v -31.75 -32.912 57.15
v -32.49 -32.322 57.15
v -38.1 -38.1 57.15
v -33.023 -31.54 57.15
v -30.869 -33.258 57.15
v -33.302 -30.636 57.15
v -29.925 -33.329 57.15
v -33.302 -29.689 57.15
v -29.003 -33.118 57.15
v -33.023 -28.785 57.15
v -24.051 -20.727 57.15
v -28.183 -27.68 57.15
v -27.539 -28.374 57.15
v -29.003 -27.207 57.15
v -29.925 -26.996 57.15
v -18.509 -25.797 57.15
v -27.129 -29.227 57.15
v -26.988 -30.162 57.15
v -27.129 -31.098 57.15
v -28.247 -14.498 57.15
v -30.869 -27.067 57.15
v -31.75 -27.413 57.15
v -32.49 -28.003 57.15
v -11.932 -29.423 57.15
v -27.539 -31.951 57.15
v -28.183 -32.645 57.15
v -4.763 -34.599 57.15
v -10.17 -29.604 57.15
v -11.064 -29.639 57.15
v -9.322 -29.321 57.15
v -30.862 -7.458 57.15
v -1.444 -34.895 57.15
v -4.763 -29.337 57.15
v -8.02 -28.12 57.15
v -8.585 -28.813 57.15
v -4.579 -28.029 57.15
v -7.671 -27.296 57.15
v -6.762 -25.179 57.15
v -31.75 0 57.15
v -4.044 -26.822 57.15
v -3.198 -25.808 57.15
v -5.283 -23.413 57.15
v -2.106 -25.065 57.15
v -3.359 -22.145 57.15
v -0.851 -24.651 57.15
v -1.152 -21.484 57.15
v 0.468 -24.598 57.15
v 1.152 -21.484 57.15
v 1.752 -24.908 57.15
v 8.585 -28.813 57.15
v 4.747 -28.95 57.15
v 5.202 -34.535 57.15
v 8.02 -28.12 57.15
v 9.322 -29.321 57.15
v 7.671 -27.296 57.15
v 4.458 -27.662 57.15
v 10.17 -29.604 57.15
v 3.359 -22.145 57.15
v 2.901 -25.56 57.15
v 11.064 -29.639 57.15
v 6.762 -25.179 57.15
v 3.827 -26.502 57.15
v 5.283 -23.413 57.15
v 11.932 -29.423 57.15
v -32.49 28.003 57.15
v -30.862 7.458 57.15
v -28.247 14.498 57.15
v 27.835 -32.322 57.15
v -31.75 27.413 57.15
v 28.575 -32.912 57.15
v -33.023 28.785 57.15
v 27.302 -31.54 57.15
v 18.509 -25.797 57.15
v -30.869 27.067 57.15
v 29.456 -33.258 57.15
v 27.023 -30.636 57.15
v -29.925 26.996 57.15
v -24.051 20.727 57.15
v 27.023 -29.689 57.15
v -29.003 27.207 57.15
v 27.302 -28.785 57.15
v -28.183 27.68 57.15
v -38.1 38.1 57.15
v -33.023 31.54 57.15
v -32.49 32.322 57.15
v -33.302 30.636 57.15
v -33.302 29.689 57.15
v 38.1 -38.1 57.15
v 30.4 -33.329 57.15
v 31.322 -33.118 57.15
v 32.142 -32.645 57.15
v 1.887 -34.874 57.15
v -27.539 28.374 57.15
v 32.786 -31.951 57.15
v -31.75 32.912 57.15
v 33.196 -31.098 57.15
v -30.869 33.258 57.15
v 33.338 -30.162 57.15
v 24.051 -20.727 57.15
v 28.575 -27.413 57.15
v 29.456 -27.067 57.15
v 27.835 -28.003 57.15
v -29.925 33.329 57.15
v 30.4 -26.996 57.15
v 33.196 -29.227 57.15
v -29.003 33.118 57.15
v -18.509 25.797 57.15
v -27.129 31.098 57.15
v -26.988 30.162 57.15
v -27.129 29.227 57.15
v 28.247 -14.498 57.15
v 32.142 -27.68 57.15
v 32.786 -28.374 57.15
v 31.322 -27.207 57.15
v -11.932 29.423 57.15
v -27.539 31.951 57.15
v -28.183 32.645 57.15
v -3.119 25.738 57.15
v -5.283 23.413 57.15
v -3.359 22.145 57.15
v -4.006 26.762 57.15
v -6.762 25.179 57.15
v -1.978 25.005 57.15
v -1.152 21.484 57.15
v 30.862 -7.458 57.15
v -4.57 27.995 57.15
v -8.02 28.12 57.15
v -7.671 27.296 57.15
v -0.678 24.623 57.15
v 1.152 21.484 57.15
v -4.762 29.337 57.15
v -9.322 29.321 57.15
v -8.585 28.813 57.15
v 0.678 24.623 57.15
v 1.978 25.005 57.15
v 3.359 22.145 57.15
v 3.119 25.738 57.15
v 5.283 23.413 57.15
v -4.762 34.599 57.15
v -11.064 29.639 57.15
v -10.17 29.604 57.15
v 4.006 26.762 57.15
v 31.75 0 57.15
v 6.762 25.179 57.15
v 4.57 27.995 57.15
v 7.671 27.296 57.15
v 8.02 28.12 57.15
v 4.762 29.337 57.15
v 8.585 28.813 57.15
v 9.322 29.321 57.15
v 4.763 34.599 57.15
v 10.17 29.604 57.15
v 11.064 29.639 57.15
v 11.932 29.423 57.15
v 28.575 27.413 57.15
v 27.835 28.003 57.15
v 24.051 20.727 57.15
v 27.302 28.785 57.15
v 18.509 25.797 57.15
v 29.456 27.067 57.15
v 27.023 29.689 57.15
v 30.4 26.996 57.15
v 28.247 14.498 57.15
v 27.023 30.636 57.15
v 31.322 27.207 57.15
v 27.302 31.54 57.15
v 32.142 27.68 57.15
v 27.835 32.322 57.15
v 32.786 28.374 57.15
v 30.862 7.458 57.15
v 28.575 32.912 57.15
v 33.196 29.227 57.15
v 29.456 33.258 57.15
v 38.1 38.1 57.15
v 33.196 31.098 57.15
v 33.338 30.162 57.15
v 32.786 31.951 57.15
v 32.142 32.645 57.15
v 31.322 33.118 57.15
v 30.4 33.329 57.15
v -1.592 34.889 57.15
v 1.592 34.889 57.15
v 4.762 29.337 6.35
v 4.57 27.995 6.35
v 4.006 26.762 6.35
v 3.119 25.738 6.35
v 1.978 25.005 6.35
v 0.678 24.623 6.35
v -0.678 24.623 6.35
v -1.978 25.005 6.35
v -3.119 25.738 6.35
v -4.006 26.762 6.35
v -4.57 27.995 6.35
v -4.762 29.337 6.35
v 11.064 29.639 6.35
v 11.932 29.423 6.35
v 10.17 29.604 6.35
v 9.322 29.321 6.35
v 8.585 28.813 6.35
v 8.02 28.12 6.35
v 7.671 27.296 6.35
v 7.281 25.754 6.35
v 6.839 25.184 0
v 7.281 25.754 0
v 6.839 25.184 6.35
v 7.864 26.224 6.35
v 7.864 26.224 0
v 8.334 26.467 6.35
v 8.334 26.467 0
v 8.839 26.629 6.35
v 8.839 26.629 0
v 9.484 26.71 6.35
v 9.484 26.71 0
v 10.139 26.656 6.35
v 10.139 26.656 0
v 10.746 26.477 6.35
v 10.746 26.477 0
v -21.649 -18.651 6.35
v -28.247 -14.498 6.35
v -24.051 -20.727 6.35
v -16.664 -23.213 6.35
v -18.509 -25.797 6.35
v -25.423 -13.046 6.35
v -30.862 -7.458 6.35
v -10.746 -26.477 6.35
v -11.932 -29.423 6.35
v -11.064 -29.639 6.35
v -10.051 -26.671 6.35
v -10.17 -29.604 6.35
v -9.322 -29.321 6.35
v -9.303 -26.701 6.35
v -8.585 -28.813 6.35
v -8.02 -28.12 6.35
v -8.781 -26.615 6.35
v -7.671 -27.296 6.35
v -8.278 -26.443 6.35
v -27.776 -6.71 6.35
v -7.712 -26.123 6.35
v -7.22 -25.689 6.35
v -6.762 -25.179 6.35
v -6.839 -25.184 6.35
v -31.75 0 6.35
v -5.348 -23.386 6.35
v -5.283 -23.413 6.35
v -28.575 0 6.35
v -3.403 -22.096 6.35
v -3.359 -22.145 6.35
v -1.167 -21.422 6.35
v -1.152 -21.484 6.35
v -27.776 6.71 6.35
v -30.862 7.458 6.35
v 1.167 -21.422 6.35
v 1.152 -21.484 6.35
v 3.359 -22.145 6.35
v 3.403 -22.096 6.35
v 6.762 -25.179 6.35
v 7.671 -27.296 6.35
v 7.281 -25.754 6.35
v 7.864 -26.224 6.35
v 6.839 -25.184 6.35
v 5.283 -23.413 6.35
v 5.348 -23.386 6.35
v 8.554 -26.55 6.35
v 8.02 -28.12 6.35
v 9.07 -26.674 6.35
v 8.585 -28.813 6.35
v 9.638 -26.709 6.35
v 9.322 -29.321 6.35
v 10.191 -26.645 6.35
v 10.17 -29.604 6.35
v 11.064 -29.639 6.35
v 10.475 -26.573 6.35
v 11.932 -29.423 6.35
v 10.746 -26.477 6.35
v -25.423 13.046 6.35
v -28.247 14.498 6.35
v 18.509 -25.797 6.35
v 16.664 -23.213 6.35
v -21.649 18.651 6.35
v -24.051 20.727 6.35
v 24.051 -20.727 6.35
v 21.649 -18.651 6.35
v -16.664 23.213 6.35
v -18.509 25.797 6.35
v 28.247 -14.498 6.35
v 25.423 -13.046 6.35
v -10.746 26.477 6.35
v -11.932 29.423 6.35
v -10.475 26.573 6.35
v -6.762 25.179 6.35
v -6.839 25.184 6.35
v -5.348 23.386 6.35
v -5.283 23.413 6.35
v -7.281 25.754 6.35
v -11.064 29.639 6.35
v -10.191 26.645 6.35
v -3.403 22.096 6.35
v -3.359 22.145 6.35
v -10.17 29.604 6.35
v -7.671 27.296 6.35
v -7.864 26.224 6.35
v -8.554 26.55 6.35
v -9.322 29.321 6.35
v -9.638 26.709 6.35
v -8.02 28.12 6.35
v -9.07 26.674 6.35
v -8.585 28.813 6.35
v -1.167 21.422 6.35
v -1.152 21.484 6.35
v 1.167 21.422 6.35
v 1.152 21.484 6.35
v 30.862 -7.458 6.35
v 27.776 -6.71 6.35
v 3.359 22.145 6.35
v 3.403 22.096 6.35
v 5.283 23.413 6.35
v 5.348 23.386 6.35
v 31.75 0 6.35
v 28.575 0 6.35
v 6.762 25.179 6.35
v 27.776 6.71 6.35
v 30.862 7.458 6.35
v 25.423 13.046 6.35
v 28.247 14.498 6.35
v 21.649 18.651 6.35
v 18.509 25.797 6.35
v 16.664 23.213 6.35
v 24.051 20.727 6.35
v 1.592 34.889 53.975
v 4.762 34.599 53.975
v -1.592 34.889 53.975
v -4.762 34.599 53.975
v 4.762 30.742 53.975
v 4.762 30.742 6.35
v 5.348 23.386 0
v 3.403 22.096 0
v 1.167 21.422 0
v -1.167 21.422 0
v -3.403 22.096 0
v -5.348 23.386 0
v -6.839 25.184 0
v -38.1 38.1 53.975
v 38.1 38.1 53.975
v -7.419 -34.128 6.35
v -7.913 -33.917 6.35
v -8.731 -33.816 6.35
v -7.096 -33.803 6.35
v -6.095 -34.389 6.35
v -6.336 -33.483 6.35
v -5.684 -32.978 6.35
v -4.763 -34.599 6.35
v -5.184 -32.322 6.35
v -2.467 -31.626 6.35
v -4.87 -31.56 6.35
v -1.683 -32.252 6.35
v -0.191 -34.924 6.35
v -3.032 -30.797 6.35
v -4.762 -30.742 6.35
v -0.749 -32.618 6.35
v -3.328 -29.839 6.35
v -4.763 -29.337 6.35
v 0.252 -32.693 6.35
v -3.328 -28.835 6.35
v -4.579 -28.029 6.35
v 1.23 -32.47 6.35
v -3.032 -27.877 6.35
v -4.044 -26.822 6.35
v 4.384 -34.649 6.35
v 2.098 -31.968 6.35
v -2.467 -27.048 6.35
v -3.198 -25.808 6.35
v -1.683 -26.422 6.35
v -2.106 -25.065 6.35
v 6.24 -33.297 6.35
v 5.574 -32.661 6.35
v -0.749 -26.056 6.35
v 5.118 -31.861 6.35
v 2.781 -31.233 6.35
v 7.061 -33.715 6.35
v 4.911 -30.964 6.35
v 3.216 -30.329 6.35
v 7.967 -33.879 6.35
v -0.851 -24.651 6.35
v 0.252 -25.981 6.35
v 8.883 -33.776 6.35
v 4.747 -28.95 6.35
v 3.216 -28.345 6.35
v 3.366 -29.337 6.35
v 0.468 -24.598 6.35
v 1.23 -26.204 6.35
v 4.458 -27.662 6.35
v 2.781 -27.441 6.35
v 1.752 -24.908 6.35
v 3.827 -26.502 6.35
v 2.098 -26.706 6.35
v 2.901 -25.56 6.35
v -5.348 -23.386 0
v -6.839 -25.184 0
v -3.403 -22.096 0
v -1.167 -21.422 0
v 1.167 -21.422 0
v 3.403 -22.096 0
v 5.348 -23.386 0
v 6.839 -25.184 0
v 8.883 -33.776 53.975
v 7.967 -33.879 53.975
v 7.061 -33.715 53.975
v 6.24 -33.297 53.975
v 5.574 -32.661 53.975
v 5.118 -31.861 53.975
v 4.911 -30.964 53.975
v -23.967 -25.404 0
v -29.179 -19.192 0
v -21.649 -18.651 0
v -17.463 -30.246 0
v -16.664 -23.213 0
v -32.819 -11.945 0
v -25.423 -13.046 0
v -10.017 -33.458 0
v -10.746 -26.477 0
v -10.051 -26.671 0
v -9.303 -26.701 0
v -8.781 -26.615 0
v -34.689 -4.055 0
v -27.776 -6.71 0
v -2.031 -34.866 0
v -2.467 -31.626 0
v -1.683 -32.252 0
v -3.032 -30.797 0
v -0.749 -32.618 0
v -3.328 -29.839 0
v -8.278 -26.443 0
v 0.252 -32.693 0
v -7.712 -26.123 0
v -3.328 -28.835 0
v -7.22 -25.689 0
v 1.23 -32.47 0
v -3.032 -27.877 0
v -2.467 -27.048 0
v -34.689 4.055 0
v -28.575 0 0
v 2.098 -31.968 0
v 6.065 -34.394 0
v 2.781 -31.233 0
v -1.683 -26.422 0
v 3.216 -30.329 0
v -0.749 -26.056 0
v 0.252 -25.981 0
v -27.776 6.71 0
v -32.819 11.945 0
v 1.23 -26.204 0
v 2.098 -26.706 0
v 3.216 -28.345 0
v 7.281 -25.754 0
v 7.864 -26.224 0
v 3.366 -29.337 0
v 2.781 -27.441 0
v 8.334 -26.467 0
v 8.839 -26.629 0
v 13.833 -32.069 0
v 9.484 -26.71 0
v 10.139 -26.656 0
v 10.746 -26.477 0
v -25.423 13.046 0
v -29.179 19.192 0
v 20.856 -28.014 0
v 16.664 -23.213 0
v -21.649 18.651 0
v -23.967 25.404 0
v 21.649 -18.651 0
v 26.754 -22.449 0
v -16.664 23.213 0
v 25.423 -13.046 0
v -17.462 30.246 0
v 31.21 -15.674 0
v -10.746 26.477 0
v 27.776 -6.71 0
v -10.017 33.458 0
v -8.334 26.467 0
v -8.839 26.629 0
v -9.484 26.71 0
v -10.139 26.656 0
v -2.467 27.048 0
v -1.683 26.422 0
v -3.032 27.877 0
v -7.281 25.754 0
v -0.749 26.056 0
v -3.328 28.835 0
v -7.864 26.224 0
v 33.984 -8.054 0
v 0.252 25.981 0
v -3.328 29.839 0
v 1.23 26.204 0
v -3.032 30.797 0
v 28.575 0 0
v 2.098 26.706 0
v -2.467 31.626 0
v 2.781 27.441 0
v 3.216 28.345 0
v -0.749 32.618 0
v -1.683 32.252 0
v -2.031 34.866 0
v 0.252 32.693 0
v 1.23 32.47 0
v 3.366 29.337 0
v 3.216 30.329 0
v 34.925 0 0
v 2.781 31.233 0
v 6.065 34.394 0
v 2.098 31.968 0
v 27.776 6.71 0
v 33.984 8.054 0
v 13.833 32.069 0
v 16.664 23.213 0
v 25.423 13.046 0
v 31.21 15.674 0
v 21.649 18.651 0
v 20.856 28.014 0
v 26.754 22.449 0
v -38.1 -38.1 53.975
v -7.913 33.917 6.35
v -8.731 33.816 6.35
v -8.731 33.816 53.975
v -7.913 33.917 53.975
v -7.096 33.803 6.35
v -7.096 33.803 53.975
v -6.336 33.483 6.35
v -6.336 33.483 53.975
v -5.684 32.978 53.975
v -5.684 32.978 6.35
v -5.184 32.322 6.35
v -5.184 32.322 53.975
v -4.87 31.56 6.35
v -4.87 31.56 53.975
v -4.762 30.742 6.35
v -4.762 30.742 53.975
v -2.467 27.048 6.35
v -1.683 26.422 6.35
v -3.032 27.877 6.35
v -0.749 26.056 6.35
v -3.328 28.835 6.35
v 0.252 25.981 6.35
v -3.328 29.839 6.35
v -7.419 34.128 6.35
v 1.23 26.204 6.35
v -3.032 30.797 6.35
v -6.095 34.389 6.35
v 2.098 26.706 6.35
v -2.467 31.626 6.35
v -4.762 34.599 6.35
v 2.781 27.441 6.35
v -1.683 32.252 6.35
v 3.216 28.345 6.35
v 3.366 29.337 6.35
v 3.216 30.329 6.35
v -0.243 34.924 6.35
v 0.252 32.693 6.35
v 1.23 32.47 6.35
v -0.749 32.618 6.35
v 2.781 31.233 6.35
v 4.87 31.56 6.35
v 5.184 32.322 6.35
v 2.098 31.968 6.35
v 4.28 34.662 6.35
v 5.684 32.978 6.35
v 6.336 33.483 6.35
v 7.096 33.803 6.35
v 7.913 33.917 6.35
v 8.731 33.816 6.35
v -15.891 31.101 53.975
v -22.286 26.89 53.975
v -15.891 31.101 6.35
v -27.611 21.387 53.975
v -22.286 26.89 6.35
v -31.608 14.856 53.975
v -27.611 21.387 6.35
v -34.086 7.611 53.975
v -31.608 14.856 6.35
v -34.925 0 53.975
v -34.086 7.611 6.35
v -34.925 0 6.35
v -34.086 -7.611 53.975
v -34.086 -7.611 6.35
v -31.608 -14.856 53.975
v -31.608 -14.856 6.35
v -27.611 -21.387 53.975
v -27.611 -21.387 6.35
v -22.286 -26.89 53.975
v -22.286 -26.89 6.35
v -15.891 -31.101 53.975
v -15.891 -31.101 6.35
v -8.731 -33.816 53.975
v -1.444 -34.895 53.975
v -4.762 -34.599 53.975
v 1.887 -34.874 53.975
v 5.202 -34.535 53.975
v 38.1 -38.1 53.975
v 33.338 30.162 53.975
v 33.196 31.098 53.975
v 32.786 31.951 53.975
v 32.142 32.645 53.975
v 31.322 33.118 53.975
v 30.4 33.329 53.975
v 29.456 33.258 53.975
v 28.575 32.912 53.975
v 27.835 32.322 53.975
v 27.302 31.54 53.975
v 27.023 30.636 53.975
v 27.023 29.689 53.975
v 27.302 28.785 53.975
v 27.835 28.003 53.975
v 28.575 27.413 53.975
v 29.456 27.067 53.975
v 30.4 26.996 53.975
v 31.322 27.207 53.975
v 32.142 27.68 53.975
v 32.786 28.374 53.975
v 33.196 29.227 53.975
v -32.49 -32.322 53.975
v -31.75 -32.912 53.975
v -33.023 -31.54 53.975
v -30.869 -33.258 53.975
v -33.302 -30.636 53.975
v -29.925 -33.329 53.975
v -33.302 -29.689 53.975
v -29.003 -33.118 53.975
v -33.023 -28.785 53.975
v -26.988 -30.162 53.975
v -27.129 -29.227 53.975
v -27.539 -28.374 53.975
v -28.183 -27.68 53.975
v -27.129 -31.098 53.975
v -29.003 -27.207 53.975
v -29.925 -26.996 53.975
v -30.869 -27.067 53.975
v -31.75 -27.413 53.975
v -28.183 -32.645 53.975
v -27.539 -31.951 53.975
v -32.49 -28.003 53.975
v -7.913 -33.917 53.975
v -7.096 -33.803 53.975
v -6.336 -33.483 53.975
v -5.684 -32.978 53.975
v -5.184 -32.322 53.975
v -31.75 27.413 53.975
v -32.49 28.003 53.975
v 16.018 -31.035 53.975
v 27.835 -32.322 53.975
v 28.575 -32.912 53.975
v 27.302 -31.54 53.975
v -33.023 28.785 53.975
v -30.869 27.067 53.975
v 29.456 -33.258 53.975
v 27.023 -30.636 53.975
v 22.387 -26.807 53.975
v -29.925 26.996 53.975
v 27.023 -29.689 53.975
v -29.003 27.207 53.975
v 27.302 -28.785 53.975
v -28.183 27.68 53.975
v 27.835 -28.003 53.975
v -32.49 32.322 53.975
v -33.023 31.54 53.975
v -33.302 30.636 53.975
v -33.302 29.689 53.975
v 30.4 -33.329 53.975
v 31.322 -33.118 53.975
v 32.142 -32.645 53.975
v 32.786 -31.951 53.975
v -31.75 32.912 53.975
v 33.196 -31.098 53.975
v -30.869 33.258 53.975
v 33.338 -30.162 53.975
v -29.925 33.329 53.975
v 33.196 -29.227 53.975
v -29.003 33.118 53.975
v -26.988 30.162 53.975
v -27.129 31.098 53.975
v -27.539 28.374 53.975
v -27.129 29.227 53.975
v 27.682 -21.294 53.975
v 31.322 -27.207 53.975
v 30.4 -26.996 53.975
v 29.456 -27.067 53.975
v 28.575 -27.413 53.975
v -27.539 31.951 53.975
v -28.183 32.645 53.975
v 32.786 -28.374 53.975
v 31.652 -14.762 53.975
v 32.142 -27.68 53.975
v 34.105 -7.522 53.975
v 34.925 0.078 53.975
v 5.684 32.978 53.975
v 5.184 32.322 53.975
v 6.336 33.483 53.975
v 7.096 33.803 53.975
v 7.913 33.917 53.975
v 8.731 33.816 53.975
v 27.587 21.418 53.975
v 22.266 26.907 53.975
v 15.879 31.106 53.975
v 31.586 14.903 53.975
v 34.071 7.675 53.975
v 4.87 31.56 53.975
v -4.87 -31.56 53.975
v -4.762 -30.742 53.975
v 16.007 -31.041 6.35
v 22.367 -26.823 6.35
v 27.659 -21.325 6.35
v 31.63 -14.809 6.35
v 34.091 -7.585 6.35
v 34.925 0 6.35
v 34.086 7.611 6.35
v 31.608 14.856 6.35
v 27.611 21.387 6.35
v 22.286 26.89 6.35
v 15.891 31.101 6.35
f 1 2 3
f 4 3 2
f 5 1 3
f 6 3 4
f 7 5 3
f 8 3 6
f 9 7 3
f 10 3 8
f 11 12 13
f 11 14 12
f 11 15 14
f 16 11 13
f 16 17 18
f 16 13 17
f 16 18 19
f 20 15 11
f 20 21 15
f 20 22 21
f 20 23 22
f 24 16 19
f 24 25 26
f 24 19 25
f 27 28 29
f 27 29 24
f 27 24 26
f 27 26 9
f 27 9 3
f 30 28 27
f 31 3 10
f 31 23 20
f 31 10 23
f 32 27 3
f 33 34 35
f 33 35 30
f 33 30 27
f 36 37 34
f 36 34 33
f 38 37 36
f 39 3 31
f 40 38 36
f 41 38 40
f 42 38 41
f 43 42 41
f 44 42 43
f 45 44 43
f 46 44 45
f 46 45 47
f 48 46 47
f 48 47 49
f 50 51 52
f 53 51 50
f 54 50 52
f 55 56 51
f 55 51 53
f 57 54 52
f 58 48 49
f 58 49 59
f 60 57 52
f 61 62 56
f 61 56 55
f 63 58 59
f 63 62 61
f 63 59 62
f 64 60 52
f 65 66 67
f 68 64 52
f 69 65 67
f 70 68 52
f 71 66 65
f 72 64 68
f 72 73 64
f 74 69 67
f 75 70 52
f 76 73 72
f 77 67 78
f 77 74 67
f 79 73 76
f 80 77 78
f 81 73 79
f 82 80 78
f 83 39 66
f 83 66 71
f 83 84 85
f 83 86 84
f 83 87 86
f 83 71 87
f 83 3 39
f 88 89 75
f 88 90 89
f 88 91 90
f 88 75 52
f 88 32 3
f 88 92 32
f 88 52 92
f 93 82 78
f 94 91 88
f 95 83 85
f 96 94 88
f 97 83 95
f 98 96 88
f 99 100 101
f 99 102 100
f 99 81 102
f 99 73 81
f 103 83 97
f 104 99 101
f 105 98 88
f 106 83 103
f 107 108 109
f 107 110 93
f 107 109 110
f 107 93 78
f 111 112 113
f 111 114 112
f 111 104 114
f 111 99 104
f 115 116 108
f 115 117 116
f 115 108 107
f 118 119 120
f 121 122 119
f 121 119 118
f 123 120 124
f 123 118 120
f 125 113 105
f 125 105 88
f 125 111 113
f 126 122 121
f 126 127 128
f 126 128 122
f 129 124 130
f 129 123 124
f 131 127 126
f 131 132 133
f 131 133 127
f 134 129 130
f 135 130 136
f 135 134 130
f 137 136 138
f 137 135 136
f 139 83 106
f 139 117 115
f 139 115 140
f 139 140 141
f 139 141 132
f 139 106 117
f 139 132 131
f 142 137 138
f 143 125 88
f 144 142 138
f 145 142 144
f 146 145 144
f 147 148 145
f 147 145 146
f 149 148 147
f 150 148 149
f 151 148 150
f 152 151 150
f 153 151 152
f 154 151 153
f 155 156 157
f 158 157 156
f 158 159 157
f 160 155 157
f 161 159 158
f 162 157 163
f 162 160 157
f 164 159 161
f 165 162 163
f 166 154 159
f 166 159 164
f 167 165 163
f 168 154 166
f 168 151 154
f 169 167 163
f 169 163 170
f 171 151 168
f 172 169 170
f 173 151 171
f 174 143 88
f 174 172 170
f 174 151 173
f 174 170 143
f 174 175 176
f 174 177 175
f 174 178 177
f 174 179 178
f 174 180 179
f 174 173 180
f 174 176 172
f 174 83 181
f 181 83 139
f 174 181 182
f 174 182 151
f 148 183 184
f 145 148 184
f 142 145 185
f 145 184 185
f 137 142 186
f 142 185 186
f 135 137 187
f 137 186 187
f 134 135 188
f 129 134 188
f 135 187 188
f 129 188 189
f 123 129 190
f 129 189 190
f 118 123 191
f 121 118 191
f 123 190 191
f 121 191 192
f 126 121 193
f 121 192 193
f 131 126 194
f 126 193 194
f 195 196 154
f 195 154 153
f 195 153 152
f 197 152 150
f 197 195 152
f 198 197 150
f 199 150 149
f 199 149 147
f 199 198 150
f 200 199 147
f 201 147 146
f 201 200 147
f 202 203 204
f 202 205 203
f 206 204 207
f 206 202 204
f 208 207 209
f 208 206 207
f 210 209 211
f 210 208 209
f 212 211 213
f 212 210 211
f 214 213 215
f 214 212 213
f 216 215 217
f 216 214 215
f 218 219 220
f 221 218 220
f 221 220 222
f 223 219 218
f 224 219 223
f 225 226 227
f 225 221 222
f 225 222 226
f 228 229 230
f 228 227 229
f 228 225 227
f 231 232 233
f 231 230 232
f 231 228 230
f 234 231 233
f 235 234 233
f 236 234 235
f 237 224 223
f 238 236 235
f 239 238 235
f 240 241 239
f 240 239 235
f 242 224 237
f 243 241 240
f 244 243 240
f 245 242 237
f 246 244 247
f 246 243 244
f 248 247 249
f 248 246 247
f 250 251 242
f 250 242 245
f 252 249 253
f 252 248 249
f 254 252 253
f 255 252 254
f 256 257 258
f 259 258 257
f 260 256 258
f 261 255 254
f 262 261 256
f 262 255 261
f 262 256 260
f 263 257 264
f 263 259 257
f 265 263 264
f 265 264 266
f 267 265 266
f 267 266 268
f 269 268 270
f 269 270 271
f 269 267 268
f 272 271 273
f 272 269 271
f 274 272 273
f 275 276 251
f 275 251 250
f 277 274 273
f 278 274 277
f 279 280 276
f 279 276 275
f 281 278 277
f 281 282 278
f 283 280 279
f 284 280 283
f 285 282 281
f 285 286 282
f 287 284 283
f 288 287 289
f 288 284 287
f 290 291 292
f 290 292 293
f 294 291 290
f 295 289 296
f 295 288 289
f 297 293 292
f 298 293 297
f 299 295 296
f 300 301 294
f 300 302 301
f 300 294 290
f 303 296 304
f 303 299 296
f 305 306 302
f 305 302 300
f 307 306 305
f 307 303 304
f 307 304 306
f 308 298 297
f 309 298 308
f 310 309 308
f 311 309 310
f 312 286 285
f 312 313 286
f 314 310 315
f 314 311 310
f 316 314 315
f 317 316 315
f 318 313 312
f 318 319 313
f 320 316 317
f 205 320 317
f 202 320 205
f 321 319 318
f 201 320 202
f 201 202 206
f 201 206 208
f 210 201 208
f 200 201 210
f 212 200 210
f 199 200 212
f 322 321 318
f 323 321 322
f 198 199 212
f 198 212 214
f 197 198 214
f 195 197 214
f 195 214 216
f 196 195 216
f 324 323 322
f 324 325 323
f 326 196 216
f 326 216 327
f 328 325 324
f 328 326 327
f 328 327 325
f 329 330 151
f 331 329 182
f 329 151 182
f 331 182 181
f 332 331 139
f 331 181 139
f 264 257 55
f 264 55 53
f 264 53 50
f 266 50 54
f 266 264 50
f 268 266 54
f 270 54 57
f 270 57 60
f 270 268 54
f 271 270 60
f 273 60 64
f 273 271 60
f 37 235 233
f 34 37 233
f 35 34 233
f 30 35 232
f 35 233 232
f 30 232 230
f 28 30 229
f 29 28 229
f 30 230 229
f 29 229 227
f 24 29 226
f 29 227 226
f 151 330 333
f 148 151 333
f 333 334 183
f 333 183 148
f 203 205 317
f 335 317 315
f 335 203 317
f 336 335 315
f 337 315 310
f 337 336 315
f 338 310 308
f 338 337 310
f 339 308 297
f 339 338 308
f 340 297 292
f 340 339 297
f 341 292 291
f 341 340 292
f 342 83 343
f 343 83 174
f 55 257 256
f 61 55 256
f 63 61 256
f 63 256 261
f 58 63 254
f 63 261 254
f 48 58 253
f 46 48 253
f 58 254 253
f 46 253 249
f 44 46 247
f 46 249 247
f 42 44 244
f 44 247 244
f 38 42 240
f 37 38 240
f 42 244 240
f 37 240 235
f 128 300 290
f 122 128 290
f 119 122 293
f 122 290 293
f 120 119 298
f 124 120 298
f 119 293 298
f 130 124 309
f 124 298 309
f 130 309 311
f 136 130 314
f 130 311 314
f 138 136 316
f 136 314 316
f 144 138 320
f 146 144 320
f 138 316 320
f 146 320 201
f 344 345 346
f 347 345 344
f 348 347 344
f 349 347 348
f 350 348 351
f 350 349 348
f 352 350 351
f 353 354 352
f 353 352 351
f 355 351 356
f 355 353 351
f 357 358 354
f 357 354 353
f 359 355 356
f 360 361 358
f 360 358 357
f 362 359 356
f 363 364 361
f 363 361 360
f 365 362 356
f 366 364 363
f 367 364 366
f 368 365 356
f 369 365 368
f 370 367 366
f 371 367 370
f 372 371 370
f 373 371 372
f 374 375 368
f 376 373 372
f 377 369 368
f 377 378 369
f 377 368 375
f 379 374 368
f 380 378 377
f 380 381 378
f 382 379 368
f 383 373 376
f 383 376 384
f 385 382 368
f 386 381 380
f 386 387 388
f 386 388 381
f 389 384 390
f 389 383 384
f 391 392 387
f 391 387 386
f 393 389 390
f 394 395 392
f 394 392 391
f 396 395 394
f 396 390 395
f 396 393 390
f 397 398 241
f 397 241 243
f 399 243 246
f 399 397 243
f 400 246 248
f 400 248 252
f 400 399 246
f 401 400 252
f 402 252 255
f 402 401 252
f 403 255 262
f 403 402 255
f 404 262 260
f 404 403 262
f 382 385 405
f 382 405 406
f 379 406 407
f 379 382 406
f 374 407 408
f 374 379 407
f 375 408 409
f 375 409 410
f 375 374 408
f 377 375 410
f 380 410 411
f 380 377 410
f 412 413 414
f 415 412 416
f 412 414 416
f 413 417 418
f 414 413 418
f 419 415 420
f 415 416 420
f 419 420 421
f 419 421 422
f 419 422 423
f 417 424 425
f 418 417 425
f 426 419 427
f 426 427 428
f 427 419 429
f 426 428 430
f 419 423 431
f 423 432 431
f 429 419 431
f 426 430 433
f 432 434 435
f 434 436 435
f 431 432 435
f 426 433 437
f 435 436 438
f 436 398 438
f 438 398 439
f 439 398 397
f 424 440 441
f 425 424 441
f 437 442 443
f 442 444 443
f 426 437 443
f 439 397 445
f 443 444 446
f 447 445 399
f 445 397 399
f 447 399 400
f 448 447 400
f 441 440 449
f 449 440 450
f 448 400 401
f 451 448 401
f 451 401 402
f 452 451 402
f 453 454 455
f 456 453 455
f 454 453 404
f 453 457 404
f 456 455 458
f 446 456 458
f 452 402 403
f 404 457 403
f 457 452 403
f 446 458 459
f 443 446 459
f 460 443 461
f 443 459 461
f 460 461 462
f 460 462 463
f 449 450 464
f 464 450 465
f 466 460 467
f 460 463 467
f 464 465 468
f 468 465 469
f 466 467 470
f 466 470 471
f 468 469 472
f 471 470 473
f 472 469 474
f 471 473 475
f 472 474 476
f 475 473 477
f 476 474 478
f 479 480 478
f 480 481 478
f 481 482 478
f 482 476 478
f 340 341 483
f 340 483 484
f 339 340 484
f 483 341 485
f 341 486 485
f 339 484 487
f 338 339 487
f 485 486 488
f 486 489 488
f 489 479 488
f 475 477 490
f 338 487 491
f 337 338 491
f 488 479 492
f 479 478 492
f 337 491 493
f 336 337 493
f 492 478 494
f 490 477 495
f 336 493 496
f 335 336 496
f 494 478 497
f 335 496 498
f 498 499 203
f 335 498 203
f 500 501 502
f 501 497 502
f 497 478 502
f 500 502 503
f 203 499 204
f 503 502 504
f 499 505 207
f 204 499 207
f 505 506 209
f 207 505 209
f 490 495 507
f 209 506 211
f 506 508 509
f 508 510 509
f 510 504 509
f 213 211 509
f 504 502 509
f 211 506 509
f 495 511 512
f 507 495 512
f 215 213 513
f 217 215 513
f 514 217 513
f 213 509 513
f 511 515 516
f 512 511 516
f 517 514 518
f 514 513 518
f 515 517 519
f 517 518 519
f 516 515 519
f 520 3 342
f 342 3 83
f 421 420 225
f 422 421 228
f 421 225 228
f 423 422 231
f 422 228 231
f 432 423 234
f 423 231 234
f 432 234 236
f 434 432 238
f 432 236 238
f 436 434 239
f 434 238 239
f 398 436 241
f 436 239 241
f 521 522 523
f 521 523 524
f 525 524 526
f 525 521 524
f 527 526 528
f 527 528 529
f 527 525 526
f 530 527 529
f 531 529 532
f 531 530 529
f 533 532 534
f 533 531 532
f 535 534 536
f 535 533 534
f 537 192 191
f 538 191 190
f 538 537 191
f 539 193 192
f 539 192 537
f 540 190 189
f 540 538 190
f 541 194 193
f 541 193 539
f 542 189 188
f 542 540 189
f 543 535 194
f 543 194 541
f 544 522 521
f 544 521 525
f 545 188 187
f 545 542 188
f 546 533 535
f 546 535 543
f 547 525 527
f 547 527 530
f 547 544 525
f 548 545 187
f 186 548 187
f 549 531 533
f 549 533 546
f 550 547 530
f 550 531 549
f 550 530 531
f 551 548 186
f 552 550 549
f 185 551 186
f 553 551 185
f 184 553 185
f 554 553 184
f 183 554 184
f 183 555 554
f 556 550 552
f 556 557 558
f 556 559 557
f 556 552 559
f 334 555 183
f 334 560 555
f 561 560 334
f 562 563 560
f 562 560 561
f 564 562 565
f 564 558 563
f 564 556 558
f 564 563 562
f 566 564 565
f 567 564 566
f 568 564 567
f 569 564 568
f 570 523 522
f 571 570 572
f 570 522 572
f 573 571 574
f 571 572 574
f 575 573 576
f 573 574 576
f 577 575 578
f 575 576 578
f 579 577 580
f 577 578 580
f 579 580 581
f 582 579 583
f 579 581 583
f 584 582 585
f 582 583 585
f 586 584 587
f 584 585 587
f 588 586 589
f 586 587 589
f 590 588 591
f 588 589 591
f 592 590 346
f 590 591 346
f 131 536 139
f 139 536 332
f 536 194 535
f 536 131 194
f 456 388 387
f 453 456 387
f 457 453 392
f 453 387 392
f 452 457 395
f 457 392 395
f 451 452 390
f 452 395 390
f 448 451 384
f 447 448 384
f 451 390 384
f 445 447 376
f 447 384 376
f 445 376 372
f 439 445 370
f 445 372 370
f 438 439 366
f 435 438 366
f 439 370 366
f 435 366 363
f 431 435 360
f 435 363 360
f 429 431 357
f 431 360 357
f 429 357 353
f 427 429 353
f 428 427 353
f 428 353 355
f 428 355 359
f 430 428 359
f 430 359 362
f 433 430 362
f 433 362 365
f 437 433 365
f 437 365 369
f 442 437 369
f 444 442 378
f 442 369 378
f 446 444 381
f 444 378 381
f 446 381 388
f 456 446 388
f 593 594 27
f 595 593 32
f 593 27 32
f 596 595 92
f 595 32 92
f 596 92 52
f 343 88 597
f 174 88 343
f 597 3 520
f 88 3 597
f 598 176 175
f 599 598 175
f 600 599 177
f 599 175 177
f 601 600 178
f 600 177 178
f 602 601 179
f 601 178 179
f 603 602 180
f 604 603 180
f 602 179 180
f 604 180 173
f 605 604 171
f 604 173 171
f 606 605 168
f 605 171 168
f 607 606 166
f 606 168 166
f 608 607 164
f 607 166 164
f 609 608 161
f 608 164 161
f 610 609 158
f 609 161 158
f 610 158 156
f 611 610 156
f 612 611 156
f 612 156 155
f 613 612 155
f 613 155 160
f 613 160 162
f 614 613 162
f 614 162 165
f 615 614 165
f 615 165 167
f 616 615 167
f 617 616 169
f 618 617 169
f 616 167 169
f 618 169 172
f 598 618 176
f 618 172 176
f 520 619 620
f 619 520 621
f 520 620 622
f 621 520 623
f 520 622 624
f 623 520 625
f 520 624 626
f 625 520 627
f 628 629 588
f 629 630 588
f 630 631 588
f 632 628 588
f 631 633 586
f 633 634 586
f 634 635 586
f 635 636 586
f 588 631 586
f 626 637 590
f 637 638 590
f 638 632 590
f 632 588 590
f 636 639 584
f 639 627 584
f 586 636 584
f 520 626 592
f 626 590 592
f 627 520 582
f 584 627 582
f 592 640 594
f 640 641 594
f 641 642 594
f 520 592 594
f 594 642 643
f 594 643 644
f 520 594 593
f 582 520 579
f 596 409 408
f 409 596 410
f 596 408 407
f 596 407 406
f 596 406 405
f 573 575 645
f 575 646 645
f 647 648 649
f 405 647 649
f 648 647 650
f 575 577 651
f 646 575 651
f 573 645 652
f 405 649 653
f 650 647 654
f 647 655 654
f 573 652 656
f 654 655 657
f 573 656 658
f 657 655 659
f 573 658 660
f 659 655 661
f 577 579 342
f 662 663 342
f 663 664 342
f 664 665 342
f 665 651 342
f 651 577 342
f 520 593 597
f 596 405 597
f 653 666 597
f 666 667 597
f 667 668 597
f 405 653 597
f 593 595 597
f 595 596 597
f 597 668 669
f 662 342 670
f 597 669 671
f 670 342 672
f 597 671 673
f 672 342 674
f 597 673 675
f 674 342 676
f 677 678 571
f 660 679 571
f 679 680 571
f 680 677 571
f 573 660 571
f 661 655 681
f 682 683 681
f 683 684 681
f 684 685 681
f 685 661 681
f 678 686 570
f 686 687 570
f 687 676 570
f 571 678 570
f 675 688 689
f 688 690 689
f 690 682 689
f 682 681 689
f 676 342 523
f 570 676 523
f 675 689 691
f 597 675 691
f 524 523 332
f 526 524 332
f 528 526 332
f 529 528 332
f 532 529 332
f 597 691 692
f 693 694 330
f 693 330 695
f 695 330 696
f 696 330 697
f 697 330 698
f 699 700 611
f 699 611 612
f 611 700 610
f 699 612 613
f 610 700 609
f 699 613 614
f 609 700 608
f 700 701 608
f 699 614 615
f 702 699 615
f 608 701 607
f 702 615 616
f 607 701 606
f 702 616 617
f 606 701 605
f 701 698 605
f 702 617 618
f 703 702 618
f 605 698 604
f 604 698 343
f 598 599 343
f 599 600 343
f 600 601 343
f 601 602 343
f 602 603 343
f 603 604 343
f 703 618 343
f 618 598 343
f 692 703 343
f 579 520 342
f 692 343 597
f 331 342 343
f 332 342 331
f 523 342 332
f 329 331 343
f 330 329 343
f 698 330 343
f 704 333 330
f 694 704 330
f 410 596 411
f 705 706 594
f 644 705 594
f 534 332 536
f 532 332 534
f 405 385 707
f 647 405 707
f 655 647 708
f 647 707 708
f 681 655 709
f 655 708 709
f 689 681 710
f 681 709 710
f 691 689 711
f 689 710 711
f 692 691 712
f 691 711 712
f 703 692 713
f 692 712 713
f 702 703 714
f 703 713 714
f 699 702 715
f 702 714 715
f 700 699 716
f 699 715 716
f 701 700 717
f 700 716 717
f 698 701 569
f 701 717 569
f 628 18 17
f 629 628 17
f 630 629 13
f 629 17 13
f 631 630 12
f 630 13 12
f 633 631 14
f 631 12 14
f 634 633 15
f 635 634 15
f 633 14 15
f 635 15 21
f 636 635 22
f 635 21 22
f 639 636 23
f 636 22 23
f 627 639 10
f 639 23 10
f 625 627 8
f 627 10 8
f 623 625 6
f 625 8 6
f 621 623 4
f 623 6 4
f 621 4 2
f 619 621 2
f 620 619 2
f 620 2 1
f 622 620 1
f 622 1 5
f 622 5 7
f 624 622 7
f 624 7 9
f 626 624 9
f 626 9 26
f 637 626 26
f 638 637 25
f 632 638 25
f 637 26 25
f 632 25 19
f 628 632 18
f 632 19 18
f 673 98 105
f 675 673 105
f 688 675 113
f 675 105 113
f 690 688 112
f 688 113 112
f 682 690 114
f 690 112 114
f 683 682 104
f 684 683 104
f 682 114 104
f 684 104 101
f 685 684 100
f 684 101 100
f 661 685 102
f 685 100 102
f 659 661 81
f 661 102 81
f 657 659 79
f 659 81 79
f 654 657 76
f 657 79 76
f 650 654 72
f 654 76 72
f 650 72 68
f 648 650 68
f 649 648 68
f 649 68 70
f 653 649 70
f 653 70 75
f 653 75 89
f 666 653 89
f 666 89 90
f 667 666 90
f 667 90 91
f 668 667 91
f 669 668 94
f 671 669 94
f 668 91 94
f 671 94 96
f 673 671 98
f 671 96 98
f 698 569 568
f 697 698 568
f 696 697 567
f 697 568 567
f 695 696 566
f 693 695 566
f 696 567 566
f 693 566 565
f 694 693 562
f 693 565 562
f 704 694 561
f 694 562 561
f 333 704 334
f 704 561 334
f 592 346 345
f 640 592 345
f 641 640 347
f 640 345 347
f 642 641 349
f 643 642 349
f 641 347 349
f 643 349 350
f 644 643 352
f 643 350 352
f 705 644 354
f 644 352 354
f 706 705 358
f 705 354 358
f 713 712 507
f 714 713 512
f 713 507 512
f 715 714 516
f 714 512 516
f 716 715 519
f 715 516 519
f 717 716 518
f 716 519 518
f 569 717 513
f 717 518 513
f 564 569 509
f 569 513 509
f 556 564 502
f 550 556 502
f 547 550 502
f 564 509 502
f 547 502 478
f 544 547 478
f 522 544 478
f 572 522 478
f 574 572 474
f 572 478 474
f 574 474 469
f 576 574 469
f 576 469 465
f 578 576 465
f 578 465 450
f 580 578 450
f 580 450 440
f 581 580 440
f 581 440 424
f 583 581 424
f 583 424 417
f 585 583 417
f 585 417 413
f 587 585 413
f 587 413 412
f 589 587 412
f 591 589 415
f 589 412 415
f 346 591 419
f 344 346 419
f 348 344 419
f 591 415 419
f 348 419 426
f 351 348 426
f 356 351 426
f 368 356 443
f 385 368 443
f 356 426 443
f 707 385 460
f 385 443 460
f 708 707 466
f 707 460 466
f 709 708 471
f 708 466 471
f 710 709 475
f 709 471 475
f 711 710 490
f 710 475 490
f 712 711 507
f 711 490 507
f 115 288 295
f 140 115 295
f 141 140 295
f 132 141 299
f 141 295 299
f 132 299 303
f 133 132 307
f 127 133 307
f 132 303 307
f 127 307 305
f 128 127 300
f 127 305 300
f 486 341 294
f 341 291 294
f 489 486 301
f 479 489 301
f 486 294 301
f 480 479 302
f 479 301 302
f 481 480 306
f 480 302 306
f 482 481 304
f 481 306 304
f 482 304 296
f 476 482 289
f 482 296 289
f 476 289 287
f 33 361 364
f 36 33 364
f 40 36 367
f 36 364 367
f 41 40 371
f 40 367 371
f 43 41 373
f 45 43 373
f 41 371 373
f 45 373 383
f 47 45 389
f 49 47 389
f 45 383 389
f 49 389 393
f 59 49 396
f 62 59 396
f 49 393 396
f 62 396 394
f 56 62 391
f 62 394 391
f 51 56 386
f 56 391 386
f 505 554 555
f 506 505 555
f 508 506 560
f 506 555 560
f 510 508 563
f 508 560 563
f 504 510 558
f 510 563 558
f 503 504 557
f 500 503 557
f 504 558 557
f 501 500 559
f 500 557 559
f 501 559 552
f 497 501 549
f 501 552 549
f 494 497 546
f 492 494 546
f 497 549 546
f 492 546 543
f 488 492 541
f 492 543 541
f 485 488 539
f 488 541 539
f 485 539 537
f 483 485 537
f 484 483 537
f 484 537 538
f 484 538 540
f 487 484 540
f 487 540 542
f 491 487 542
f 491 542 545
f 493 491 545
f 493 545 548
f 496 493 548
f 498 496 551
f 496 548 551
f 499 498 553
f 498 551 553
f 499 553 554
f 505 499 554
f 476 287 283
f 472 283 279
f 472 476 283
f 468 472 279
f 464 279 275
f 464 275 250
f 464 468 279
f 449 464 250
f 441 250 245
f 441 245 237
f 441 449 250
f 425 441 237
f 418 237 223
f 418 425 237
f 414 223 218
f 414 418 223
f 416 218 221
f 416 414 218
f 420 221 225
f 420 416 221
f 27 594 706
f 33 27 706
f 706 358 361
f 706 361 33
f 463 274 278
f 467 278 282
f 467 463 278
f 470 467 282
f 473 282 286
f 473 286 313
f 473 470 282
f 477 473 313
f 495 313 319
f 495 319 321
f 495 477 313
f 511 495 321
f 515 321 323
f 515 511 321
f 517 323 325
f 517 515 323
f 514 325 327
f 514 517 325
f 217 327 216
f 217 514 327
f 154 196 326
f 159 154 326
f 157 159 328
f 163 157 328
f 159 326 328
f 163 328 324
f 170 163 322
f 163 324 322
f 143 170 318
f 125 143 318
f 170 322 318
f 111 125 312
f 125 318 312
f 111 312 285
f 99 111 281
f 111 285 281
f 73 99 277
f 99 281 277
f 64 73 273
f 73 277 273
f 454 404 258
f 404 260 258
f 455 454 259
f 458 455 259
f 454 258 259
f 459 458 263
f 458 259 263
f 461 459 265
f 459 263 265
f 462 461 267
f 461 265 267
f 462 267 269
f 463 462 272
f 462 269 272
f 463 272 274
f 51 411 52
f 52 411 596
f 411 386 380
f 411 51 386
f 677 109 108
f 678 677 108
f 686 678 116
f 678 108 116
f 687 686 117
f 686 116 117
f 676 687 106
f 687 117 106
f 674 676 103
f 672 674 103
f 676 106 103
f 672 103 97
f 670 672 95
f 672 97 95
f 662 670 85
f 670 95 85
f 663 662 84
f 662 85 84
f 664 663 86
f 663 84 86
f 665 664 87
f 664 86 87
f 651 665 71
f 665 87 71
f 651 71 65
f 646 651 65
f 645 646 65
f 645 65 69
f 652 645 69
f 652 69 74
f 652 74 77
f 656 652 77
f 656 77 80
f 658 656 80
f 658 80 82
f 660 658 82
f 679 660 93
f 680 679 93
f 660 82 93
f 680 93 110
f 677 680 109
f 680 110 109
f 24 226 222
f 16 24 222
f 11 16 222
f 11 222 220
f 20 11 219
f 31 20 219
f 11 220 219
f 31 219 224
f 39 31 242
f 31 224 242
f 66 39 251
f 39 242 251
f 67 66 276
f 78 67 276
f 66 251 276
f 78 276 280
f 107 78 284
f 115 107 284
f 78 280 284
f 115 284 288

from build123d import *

# Parameters (mm, degrees)
F0_R         = 34.925
F1_DEPTH     = 6.35
F3_DEPTH     = 50.8
F4_R         = 3.3655
F5_DEPTH     = 6.35
F6_W         = 76.2
F6_H         = 76.2
F6_R         = 34.925
F7_DEPTH     = 3.175
F8_R         = 3.175
F9_DEPTH     = 3.175
F10_T1_DEPTH = 50.8
F10_T3_DEPTH = 47.625
F12_DEPTH    = 6.35
F13_R        = 3.175


# Not quite as in the source:
# - a fillet or chamfer that OpenCascade refuses, or shapes differently, is made with other operations: its cross-section is extruded or revolved along the edge and cut away or added


with BuildPart() as f1:
    # F0 (on Top) → F1 (new body)
    with BuildSketch(Plane.XY):
        Circle(F0_R)
    extrude(amount=F1_DEPTH)

    # F2 (on face) → F3 (join)
    with BuildSketch(Plane.XY.offset(6.35)):
        with BuildLine():
            ThreePointArc((4.7625, 29.337), (0, 24.5745), (-4.7625, 29.337))
            Line((-4.7625, 29.337), (-4.7625, 34.5987603644))
            ThreePointArc((-4.7625, 34.5987603644), (-34.925, 0), (-4.7625, -34.5987603644))
            Line((-4.7625, -34.5987603644), (-4.7625, -29.337))
            ThreePointArc((-4.7625, -29.337), (-0.1934429178, -24.5784302477), (4.7467854961, -28.9504334416))
            Line((4.7467854961, -28.9504334416), (5.2016172982, -34.5354716557))
            ThreePointArc((5.2016172982, -34.5354716557), (26.4709473682, -22.7825496912), (34.925, 0))
            ThreePointArc((34.925, 0), (26.3257092734, 22.950221268), (4.7625, 34.5987603644))
            Line((4.7625, 34.5987603644), (4.7625, 29.337))
        make_face()
        with BuildLine():
            ThreePointArc((-7.9375, -30.7418053105), (-31.75, 0), (-7.9375, 30.7418053105))
            Line((-7.9375, 30.7418053105), (-7.9375, 29.337))
            ThreePointArc((-7.9375, 29.337), (0, 21.3995), (7.9375, 29.337))
            Line((7.9375, 29.337), (7.9375, 30.7418053105))
            ThreePointArc((7.9375, 30.7418053105), (31.7499202127, 0.0711792809), (8.075257951, -30.7059067449))
            Line((8.075257951, -30.7059067449), (7.9113091602, -28.6927224026))
            ThreePointArc((7.9113091602, -28.6927224026), (-0.3224048629, -21.4060504128), (-7.9375, -29.337))
            Line((-7.9375, -29.337), (-7.9375, -30.7418053105))
        make_face(mode=Mode.SUBTRACT)
    extrude(amount=F3_DEPTH)

    # F4 (on face) → F5 (cut, through all)
    with BuildSketch(Plane.XY.offset(6.35)):
        with Locations((0, 29.337)):
            Circle(F4_R)
        with Locations((0, -29.337)):
            Circle(F4_R)
    extrude(amount=-F5_DEPTH, mode=Mode.SUBTRACT)

    # F6 (on face) → F7 (join)
    with BuildSketch(Plane.XY.offset(57.15)):
        Rectangle(F6_W, F6_H)
        Circle(F6_R, mode=Mode.SUBTRACT)
    extrude(amount=-F7_DEPTH)

    # F8 (on face) → F9 (cut, through all)
    with BuildSketch(Plane.XY.offset(57.15)):
        with Locations((-30.1625, 30.1625)):
            Circle(F8_R)
        with Locations((30.1625, 30.1625)):
            Circle(F8_R)
        with Locations((-30.1625, -30.1625)):
            Circle(F8_R)
        with Locations((30.1625, -30.1625)):
            Circle(F8_R)
    extrude(amount=-F9_DEPTH, mode=Mode.SUBTRACT)

    # F10: fillet of radius 3.175 on 8 edges, made by hand

    # F10_s2 → F10_t1 (join)
    with BuildSketch(Plane.XY.offset(6.35)):
        with BuildLine():
            ThreePointArc((-7.6707325335, -27.2964685374), (-9.3216408312, -29.3213201135), (-11.9322506076, -29.4225066138))
            Line((-11.9322506076, -29.4225066138), (-12.0515731137, -29.7167316799))
            ThreePointArc((-12.0515731137, -29.7167316799), (-10.0563182102, -30.4498771805), (-8.016875, -31.0492233636))
            Line((-8.016875, -31.0492233636), (-7.62, -30.7418053105))
            ThreePointArc((-7.62, -30.7418053105), (-7.62, -29.337), (-7.3639032321, -27.3780897959))
            Line((-7.3639032321, -27.3780897959), (-7.6707325335, -27.2964685374))
        make_face()
        with BuildLine():
            ThreePointArc((7.6707325335, -27.2964685374), (9.3216408312, -29.3213201135), (11.9322506076, -29.4225066138))
            Line((11.9322506076, -29.4225066138), (12.0515731137, -29.7167316799))
            ThreePointArc((12.0515731137, -29.7167316799), (10.1245575171, -30.4272557312), (8.1560105306, -31.0129658123))
            Line((8.1560105306, -31.0129658123), (7.7588055846, -30.7316778488))
            ThreePointArc((7.7588055846, -30.7316778488), (7.5948567937, -28.7184935065), (7.3639032321, -27.3780897959))
            Line((7.3639032321, -27.3780897959), (7.6707325335, -27.2964685374))
        make_face()
        with BuildLine():
            ThreePointArc((-11.9322506076, 29.4225066138), (-9.3216408312, 29.3213201135), (-7.6707325335, 27.2964685374))
            Line((-7.6707325335, 27.2964685374), (-7.3639032321, 27.3780897959))
            ThreePointArc((-7.3639032321, 27.3780897959), (-7.62, 29.337), (-7.62, 30.7418053105))
            Line((-7.62, 30.7418053105), (-8.016875, 31.0492233636))
            ThreePointArc((-8.016875, 31.0492233636), (-10.0563182102, 30.4498771805), (-12.0515731137, 29.7167316799))
            Line((-12.0515731137, 29.7167316799), (-11.9322506076, 29.4225066138))
        make_face()
        with BuildLine():
            ThreePointArc((11.9322506076, 29.4225066138), (9.3216408312, 29.3213201135), (7.6707325335, 27.2964685374))
            Line((7.6707325335, 27.2964685374), (7.3639032321, 27.3780897959))
            ThreePointArc((7.3639032321, 27.3780897959), (7.62, 29.337), (7.62, 30.7418053105))
            Line((7.62, 30.7418053105), (8.016875, 31.0492233636))
            ThreePointArc((8.016875, 31.0492233636), (10.0563182102, 30.4498771805), (12.0515731137, 29.7167316799))
            Line((12.0515731137, 29.7167316799), (11.9322506076, 29.4225066138))
        make_face()
    extrude(amount=F10_T1_DEPTH)

    # F10_s4 → F10_t3 (cut)
    with BuildSketch(Plane.XY.offset(6.35)):
        with BuildLine():
            ThreePointArc((-8.73125, -33.8159858416), (-5.9932175167, -33.2518632033), (-4.7625, -30.7418053105))
            Line((-4.7625, -30.7418053105), (-4.7625, -34.5987603644))
            ThreePointArc((-4.7625, -34.5987603644), (-6.7582176832, -34.2648817121), (-8.73125, -33.8159858416))
        make_face()
        with BuildLine():
            ThreePointArc((8.8827837461, -33.7764974193), (6.2403375987, -33.2969861146), (4.910734287, -30.9636177838))
            Line((4.910734287, -30.9636177838), (5.2016172982, -34.5354716557))
            ThreePointArc((5.2016172982, -34.5354716557), (7.0524179305, -34.2055408718), (8.8827837461, -33.7764974193))
        make_face()
        with BuildLine():
            ThreePointArc((8.73125, 33.8159858416), (5.9932175167, 33.2518632033), (4.7625, 30.7418053105))
            Line((4.7625, 30.7418053105), (4.7625, 34.5987603644))
            ThreePointArc((4.7625, 34.5987603644), (6.7582176832, 34.2648817121), (8.73125, 33.8159858416))
        make_face()
        with BuildLine():
            ThreePointArc((-8.73125, 33.8159858416), (-5.9932175167, 33.2518632033), (-4.7625, 30.7418053105))
            Line((-4.7625, 30.7418053105), (-4.7625, 34.5987603644))
            ThreePointArc((-4.7625, 34.5987603644), (-6.7582176832, 34.2648817121), (-8.73125, 33.8159858416))
        make_face()
    extrude(amount=F10_T3_DEPTH, mode=Mode.SUBTRACT)

    # F11 (on Top) → F12 (cut, through all)
    with BuildSketch(Plane.XY):
        with BuildLine():
            ThreePointArc((7.7858076955, 27.4938506494), (0, 21.336), (-7.7858076955, 27.4938506494))
            ThreePointArc((-7.7858076955, 27.4938506494), (-28.575, 0), (-7.7858076955, -27.4938506494))
            ThreePointArc((-7.7858076955, -27.4938506494), (0, -21.336), (7.7858076955, -27.4938506494))
            ThreePointArc((7.7858076955, -27.4938506494), (28.575, 0), (7.7858076955, 27.4938506494))
        make_face()
    extrude(amount=F12_DEPTH, mode=Mode.SUBTRACT)

    # F13
    f13_edges = [f1.edges().sort_by_distance(p)[0] for p in [
        (-7.785808, 27.493851, 3.175),
        (7.785808, 27.493851, 3.175),
        (-7.785808, -27.493851, 3.175),
        (7.785808, -27.493851, 3.175),
    ]]
    fillet(f13_edges, radius=F13_R)


solid = f1.part
